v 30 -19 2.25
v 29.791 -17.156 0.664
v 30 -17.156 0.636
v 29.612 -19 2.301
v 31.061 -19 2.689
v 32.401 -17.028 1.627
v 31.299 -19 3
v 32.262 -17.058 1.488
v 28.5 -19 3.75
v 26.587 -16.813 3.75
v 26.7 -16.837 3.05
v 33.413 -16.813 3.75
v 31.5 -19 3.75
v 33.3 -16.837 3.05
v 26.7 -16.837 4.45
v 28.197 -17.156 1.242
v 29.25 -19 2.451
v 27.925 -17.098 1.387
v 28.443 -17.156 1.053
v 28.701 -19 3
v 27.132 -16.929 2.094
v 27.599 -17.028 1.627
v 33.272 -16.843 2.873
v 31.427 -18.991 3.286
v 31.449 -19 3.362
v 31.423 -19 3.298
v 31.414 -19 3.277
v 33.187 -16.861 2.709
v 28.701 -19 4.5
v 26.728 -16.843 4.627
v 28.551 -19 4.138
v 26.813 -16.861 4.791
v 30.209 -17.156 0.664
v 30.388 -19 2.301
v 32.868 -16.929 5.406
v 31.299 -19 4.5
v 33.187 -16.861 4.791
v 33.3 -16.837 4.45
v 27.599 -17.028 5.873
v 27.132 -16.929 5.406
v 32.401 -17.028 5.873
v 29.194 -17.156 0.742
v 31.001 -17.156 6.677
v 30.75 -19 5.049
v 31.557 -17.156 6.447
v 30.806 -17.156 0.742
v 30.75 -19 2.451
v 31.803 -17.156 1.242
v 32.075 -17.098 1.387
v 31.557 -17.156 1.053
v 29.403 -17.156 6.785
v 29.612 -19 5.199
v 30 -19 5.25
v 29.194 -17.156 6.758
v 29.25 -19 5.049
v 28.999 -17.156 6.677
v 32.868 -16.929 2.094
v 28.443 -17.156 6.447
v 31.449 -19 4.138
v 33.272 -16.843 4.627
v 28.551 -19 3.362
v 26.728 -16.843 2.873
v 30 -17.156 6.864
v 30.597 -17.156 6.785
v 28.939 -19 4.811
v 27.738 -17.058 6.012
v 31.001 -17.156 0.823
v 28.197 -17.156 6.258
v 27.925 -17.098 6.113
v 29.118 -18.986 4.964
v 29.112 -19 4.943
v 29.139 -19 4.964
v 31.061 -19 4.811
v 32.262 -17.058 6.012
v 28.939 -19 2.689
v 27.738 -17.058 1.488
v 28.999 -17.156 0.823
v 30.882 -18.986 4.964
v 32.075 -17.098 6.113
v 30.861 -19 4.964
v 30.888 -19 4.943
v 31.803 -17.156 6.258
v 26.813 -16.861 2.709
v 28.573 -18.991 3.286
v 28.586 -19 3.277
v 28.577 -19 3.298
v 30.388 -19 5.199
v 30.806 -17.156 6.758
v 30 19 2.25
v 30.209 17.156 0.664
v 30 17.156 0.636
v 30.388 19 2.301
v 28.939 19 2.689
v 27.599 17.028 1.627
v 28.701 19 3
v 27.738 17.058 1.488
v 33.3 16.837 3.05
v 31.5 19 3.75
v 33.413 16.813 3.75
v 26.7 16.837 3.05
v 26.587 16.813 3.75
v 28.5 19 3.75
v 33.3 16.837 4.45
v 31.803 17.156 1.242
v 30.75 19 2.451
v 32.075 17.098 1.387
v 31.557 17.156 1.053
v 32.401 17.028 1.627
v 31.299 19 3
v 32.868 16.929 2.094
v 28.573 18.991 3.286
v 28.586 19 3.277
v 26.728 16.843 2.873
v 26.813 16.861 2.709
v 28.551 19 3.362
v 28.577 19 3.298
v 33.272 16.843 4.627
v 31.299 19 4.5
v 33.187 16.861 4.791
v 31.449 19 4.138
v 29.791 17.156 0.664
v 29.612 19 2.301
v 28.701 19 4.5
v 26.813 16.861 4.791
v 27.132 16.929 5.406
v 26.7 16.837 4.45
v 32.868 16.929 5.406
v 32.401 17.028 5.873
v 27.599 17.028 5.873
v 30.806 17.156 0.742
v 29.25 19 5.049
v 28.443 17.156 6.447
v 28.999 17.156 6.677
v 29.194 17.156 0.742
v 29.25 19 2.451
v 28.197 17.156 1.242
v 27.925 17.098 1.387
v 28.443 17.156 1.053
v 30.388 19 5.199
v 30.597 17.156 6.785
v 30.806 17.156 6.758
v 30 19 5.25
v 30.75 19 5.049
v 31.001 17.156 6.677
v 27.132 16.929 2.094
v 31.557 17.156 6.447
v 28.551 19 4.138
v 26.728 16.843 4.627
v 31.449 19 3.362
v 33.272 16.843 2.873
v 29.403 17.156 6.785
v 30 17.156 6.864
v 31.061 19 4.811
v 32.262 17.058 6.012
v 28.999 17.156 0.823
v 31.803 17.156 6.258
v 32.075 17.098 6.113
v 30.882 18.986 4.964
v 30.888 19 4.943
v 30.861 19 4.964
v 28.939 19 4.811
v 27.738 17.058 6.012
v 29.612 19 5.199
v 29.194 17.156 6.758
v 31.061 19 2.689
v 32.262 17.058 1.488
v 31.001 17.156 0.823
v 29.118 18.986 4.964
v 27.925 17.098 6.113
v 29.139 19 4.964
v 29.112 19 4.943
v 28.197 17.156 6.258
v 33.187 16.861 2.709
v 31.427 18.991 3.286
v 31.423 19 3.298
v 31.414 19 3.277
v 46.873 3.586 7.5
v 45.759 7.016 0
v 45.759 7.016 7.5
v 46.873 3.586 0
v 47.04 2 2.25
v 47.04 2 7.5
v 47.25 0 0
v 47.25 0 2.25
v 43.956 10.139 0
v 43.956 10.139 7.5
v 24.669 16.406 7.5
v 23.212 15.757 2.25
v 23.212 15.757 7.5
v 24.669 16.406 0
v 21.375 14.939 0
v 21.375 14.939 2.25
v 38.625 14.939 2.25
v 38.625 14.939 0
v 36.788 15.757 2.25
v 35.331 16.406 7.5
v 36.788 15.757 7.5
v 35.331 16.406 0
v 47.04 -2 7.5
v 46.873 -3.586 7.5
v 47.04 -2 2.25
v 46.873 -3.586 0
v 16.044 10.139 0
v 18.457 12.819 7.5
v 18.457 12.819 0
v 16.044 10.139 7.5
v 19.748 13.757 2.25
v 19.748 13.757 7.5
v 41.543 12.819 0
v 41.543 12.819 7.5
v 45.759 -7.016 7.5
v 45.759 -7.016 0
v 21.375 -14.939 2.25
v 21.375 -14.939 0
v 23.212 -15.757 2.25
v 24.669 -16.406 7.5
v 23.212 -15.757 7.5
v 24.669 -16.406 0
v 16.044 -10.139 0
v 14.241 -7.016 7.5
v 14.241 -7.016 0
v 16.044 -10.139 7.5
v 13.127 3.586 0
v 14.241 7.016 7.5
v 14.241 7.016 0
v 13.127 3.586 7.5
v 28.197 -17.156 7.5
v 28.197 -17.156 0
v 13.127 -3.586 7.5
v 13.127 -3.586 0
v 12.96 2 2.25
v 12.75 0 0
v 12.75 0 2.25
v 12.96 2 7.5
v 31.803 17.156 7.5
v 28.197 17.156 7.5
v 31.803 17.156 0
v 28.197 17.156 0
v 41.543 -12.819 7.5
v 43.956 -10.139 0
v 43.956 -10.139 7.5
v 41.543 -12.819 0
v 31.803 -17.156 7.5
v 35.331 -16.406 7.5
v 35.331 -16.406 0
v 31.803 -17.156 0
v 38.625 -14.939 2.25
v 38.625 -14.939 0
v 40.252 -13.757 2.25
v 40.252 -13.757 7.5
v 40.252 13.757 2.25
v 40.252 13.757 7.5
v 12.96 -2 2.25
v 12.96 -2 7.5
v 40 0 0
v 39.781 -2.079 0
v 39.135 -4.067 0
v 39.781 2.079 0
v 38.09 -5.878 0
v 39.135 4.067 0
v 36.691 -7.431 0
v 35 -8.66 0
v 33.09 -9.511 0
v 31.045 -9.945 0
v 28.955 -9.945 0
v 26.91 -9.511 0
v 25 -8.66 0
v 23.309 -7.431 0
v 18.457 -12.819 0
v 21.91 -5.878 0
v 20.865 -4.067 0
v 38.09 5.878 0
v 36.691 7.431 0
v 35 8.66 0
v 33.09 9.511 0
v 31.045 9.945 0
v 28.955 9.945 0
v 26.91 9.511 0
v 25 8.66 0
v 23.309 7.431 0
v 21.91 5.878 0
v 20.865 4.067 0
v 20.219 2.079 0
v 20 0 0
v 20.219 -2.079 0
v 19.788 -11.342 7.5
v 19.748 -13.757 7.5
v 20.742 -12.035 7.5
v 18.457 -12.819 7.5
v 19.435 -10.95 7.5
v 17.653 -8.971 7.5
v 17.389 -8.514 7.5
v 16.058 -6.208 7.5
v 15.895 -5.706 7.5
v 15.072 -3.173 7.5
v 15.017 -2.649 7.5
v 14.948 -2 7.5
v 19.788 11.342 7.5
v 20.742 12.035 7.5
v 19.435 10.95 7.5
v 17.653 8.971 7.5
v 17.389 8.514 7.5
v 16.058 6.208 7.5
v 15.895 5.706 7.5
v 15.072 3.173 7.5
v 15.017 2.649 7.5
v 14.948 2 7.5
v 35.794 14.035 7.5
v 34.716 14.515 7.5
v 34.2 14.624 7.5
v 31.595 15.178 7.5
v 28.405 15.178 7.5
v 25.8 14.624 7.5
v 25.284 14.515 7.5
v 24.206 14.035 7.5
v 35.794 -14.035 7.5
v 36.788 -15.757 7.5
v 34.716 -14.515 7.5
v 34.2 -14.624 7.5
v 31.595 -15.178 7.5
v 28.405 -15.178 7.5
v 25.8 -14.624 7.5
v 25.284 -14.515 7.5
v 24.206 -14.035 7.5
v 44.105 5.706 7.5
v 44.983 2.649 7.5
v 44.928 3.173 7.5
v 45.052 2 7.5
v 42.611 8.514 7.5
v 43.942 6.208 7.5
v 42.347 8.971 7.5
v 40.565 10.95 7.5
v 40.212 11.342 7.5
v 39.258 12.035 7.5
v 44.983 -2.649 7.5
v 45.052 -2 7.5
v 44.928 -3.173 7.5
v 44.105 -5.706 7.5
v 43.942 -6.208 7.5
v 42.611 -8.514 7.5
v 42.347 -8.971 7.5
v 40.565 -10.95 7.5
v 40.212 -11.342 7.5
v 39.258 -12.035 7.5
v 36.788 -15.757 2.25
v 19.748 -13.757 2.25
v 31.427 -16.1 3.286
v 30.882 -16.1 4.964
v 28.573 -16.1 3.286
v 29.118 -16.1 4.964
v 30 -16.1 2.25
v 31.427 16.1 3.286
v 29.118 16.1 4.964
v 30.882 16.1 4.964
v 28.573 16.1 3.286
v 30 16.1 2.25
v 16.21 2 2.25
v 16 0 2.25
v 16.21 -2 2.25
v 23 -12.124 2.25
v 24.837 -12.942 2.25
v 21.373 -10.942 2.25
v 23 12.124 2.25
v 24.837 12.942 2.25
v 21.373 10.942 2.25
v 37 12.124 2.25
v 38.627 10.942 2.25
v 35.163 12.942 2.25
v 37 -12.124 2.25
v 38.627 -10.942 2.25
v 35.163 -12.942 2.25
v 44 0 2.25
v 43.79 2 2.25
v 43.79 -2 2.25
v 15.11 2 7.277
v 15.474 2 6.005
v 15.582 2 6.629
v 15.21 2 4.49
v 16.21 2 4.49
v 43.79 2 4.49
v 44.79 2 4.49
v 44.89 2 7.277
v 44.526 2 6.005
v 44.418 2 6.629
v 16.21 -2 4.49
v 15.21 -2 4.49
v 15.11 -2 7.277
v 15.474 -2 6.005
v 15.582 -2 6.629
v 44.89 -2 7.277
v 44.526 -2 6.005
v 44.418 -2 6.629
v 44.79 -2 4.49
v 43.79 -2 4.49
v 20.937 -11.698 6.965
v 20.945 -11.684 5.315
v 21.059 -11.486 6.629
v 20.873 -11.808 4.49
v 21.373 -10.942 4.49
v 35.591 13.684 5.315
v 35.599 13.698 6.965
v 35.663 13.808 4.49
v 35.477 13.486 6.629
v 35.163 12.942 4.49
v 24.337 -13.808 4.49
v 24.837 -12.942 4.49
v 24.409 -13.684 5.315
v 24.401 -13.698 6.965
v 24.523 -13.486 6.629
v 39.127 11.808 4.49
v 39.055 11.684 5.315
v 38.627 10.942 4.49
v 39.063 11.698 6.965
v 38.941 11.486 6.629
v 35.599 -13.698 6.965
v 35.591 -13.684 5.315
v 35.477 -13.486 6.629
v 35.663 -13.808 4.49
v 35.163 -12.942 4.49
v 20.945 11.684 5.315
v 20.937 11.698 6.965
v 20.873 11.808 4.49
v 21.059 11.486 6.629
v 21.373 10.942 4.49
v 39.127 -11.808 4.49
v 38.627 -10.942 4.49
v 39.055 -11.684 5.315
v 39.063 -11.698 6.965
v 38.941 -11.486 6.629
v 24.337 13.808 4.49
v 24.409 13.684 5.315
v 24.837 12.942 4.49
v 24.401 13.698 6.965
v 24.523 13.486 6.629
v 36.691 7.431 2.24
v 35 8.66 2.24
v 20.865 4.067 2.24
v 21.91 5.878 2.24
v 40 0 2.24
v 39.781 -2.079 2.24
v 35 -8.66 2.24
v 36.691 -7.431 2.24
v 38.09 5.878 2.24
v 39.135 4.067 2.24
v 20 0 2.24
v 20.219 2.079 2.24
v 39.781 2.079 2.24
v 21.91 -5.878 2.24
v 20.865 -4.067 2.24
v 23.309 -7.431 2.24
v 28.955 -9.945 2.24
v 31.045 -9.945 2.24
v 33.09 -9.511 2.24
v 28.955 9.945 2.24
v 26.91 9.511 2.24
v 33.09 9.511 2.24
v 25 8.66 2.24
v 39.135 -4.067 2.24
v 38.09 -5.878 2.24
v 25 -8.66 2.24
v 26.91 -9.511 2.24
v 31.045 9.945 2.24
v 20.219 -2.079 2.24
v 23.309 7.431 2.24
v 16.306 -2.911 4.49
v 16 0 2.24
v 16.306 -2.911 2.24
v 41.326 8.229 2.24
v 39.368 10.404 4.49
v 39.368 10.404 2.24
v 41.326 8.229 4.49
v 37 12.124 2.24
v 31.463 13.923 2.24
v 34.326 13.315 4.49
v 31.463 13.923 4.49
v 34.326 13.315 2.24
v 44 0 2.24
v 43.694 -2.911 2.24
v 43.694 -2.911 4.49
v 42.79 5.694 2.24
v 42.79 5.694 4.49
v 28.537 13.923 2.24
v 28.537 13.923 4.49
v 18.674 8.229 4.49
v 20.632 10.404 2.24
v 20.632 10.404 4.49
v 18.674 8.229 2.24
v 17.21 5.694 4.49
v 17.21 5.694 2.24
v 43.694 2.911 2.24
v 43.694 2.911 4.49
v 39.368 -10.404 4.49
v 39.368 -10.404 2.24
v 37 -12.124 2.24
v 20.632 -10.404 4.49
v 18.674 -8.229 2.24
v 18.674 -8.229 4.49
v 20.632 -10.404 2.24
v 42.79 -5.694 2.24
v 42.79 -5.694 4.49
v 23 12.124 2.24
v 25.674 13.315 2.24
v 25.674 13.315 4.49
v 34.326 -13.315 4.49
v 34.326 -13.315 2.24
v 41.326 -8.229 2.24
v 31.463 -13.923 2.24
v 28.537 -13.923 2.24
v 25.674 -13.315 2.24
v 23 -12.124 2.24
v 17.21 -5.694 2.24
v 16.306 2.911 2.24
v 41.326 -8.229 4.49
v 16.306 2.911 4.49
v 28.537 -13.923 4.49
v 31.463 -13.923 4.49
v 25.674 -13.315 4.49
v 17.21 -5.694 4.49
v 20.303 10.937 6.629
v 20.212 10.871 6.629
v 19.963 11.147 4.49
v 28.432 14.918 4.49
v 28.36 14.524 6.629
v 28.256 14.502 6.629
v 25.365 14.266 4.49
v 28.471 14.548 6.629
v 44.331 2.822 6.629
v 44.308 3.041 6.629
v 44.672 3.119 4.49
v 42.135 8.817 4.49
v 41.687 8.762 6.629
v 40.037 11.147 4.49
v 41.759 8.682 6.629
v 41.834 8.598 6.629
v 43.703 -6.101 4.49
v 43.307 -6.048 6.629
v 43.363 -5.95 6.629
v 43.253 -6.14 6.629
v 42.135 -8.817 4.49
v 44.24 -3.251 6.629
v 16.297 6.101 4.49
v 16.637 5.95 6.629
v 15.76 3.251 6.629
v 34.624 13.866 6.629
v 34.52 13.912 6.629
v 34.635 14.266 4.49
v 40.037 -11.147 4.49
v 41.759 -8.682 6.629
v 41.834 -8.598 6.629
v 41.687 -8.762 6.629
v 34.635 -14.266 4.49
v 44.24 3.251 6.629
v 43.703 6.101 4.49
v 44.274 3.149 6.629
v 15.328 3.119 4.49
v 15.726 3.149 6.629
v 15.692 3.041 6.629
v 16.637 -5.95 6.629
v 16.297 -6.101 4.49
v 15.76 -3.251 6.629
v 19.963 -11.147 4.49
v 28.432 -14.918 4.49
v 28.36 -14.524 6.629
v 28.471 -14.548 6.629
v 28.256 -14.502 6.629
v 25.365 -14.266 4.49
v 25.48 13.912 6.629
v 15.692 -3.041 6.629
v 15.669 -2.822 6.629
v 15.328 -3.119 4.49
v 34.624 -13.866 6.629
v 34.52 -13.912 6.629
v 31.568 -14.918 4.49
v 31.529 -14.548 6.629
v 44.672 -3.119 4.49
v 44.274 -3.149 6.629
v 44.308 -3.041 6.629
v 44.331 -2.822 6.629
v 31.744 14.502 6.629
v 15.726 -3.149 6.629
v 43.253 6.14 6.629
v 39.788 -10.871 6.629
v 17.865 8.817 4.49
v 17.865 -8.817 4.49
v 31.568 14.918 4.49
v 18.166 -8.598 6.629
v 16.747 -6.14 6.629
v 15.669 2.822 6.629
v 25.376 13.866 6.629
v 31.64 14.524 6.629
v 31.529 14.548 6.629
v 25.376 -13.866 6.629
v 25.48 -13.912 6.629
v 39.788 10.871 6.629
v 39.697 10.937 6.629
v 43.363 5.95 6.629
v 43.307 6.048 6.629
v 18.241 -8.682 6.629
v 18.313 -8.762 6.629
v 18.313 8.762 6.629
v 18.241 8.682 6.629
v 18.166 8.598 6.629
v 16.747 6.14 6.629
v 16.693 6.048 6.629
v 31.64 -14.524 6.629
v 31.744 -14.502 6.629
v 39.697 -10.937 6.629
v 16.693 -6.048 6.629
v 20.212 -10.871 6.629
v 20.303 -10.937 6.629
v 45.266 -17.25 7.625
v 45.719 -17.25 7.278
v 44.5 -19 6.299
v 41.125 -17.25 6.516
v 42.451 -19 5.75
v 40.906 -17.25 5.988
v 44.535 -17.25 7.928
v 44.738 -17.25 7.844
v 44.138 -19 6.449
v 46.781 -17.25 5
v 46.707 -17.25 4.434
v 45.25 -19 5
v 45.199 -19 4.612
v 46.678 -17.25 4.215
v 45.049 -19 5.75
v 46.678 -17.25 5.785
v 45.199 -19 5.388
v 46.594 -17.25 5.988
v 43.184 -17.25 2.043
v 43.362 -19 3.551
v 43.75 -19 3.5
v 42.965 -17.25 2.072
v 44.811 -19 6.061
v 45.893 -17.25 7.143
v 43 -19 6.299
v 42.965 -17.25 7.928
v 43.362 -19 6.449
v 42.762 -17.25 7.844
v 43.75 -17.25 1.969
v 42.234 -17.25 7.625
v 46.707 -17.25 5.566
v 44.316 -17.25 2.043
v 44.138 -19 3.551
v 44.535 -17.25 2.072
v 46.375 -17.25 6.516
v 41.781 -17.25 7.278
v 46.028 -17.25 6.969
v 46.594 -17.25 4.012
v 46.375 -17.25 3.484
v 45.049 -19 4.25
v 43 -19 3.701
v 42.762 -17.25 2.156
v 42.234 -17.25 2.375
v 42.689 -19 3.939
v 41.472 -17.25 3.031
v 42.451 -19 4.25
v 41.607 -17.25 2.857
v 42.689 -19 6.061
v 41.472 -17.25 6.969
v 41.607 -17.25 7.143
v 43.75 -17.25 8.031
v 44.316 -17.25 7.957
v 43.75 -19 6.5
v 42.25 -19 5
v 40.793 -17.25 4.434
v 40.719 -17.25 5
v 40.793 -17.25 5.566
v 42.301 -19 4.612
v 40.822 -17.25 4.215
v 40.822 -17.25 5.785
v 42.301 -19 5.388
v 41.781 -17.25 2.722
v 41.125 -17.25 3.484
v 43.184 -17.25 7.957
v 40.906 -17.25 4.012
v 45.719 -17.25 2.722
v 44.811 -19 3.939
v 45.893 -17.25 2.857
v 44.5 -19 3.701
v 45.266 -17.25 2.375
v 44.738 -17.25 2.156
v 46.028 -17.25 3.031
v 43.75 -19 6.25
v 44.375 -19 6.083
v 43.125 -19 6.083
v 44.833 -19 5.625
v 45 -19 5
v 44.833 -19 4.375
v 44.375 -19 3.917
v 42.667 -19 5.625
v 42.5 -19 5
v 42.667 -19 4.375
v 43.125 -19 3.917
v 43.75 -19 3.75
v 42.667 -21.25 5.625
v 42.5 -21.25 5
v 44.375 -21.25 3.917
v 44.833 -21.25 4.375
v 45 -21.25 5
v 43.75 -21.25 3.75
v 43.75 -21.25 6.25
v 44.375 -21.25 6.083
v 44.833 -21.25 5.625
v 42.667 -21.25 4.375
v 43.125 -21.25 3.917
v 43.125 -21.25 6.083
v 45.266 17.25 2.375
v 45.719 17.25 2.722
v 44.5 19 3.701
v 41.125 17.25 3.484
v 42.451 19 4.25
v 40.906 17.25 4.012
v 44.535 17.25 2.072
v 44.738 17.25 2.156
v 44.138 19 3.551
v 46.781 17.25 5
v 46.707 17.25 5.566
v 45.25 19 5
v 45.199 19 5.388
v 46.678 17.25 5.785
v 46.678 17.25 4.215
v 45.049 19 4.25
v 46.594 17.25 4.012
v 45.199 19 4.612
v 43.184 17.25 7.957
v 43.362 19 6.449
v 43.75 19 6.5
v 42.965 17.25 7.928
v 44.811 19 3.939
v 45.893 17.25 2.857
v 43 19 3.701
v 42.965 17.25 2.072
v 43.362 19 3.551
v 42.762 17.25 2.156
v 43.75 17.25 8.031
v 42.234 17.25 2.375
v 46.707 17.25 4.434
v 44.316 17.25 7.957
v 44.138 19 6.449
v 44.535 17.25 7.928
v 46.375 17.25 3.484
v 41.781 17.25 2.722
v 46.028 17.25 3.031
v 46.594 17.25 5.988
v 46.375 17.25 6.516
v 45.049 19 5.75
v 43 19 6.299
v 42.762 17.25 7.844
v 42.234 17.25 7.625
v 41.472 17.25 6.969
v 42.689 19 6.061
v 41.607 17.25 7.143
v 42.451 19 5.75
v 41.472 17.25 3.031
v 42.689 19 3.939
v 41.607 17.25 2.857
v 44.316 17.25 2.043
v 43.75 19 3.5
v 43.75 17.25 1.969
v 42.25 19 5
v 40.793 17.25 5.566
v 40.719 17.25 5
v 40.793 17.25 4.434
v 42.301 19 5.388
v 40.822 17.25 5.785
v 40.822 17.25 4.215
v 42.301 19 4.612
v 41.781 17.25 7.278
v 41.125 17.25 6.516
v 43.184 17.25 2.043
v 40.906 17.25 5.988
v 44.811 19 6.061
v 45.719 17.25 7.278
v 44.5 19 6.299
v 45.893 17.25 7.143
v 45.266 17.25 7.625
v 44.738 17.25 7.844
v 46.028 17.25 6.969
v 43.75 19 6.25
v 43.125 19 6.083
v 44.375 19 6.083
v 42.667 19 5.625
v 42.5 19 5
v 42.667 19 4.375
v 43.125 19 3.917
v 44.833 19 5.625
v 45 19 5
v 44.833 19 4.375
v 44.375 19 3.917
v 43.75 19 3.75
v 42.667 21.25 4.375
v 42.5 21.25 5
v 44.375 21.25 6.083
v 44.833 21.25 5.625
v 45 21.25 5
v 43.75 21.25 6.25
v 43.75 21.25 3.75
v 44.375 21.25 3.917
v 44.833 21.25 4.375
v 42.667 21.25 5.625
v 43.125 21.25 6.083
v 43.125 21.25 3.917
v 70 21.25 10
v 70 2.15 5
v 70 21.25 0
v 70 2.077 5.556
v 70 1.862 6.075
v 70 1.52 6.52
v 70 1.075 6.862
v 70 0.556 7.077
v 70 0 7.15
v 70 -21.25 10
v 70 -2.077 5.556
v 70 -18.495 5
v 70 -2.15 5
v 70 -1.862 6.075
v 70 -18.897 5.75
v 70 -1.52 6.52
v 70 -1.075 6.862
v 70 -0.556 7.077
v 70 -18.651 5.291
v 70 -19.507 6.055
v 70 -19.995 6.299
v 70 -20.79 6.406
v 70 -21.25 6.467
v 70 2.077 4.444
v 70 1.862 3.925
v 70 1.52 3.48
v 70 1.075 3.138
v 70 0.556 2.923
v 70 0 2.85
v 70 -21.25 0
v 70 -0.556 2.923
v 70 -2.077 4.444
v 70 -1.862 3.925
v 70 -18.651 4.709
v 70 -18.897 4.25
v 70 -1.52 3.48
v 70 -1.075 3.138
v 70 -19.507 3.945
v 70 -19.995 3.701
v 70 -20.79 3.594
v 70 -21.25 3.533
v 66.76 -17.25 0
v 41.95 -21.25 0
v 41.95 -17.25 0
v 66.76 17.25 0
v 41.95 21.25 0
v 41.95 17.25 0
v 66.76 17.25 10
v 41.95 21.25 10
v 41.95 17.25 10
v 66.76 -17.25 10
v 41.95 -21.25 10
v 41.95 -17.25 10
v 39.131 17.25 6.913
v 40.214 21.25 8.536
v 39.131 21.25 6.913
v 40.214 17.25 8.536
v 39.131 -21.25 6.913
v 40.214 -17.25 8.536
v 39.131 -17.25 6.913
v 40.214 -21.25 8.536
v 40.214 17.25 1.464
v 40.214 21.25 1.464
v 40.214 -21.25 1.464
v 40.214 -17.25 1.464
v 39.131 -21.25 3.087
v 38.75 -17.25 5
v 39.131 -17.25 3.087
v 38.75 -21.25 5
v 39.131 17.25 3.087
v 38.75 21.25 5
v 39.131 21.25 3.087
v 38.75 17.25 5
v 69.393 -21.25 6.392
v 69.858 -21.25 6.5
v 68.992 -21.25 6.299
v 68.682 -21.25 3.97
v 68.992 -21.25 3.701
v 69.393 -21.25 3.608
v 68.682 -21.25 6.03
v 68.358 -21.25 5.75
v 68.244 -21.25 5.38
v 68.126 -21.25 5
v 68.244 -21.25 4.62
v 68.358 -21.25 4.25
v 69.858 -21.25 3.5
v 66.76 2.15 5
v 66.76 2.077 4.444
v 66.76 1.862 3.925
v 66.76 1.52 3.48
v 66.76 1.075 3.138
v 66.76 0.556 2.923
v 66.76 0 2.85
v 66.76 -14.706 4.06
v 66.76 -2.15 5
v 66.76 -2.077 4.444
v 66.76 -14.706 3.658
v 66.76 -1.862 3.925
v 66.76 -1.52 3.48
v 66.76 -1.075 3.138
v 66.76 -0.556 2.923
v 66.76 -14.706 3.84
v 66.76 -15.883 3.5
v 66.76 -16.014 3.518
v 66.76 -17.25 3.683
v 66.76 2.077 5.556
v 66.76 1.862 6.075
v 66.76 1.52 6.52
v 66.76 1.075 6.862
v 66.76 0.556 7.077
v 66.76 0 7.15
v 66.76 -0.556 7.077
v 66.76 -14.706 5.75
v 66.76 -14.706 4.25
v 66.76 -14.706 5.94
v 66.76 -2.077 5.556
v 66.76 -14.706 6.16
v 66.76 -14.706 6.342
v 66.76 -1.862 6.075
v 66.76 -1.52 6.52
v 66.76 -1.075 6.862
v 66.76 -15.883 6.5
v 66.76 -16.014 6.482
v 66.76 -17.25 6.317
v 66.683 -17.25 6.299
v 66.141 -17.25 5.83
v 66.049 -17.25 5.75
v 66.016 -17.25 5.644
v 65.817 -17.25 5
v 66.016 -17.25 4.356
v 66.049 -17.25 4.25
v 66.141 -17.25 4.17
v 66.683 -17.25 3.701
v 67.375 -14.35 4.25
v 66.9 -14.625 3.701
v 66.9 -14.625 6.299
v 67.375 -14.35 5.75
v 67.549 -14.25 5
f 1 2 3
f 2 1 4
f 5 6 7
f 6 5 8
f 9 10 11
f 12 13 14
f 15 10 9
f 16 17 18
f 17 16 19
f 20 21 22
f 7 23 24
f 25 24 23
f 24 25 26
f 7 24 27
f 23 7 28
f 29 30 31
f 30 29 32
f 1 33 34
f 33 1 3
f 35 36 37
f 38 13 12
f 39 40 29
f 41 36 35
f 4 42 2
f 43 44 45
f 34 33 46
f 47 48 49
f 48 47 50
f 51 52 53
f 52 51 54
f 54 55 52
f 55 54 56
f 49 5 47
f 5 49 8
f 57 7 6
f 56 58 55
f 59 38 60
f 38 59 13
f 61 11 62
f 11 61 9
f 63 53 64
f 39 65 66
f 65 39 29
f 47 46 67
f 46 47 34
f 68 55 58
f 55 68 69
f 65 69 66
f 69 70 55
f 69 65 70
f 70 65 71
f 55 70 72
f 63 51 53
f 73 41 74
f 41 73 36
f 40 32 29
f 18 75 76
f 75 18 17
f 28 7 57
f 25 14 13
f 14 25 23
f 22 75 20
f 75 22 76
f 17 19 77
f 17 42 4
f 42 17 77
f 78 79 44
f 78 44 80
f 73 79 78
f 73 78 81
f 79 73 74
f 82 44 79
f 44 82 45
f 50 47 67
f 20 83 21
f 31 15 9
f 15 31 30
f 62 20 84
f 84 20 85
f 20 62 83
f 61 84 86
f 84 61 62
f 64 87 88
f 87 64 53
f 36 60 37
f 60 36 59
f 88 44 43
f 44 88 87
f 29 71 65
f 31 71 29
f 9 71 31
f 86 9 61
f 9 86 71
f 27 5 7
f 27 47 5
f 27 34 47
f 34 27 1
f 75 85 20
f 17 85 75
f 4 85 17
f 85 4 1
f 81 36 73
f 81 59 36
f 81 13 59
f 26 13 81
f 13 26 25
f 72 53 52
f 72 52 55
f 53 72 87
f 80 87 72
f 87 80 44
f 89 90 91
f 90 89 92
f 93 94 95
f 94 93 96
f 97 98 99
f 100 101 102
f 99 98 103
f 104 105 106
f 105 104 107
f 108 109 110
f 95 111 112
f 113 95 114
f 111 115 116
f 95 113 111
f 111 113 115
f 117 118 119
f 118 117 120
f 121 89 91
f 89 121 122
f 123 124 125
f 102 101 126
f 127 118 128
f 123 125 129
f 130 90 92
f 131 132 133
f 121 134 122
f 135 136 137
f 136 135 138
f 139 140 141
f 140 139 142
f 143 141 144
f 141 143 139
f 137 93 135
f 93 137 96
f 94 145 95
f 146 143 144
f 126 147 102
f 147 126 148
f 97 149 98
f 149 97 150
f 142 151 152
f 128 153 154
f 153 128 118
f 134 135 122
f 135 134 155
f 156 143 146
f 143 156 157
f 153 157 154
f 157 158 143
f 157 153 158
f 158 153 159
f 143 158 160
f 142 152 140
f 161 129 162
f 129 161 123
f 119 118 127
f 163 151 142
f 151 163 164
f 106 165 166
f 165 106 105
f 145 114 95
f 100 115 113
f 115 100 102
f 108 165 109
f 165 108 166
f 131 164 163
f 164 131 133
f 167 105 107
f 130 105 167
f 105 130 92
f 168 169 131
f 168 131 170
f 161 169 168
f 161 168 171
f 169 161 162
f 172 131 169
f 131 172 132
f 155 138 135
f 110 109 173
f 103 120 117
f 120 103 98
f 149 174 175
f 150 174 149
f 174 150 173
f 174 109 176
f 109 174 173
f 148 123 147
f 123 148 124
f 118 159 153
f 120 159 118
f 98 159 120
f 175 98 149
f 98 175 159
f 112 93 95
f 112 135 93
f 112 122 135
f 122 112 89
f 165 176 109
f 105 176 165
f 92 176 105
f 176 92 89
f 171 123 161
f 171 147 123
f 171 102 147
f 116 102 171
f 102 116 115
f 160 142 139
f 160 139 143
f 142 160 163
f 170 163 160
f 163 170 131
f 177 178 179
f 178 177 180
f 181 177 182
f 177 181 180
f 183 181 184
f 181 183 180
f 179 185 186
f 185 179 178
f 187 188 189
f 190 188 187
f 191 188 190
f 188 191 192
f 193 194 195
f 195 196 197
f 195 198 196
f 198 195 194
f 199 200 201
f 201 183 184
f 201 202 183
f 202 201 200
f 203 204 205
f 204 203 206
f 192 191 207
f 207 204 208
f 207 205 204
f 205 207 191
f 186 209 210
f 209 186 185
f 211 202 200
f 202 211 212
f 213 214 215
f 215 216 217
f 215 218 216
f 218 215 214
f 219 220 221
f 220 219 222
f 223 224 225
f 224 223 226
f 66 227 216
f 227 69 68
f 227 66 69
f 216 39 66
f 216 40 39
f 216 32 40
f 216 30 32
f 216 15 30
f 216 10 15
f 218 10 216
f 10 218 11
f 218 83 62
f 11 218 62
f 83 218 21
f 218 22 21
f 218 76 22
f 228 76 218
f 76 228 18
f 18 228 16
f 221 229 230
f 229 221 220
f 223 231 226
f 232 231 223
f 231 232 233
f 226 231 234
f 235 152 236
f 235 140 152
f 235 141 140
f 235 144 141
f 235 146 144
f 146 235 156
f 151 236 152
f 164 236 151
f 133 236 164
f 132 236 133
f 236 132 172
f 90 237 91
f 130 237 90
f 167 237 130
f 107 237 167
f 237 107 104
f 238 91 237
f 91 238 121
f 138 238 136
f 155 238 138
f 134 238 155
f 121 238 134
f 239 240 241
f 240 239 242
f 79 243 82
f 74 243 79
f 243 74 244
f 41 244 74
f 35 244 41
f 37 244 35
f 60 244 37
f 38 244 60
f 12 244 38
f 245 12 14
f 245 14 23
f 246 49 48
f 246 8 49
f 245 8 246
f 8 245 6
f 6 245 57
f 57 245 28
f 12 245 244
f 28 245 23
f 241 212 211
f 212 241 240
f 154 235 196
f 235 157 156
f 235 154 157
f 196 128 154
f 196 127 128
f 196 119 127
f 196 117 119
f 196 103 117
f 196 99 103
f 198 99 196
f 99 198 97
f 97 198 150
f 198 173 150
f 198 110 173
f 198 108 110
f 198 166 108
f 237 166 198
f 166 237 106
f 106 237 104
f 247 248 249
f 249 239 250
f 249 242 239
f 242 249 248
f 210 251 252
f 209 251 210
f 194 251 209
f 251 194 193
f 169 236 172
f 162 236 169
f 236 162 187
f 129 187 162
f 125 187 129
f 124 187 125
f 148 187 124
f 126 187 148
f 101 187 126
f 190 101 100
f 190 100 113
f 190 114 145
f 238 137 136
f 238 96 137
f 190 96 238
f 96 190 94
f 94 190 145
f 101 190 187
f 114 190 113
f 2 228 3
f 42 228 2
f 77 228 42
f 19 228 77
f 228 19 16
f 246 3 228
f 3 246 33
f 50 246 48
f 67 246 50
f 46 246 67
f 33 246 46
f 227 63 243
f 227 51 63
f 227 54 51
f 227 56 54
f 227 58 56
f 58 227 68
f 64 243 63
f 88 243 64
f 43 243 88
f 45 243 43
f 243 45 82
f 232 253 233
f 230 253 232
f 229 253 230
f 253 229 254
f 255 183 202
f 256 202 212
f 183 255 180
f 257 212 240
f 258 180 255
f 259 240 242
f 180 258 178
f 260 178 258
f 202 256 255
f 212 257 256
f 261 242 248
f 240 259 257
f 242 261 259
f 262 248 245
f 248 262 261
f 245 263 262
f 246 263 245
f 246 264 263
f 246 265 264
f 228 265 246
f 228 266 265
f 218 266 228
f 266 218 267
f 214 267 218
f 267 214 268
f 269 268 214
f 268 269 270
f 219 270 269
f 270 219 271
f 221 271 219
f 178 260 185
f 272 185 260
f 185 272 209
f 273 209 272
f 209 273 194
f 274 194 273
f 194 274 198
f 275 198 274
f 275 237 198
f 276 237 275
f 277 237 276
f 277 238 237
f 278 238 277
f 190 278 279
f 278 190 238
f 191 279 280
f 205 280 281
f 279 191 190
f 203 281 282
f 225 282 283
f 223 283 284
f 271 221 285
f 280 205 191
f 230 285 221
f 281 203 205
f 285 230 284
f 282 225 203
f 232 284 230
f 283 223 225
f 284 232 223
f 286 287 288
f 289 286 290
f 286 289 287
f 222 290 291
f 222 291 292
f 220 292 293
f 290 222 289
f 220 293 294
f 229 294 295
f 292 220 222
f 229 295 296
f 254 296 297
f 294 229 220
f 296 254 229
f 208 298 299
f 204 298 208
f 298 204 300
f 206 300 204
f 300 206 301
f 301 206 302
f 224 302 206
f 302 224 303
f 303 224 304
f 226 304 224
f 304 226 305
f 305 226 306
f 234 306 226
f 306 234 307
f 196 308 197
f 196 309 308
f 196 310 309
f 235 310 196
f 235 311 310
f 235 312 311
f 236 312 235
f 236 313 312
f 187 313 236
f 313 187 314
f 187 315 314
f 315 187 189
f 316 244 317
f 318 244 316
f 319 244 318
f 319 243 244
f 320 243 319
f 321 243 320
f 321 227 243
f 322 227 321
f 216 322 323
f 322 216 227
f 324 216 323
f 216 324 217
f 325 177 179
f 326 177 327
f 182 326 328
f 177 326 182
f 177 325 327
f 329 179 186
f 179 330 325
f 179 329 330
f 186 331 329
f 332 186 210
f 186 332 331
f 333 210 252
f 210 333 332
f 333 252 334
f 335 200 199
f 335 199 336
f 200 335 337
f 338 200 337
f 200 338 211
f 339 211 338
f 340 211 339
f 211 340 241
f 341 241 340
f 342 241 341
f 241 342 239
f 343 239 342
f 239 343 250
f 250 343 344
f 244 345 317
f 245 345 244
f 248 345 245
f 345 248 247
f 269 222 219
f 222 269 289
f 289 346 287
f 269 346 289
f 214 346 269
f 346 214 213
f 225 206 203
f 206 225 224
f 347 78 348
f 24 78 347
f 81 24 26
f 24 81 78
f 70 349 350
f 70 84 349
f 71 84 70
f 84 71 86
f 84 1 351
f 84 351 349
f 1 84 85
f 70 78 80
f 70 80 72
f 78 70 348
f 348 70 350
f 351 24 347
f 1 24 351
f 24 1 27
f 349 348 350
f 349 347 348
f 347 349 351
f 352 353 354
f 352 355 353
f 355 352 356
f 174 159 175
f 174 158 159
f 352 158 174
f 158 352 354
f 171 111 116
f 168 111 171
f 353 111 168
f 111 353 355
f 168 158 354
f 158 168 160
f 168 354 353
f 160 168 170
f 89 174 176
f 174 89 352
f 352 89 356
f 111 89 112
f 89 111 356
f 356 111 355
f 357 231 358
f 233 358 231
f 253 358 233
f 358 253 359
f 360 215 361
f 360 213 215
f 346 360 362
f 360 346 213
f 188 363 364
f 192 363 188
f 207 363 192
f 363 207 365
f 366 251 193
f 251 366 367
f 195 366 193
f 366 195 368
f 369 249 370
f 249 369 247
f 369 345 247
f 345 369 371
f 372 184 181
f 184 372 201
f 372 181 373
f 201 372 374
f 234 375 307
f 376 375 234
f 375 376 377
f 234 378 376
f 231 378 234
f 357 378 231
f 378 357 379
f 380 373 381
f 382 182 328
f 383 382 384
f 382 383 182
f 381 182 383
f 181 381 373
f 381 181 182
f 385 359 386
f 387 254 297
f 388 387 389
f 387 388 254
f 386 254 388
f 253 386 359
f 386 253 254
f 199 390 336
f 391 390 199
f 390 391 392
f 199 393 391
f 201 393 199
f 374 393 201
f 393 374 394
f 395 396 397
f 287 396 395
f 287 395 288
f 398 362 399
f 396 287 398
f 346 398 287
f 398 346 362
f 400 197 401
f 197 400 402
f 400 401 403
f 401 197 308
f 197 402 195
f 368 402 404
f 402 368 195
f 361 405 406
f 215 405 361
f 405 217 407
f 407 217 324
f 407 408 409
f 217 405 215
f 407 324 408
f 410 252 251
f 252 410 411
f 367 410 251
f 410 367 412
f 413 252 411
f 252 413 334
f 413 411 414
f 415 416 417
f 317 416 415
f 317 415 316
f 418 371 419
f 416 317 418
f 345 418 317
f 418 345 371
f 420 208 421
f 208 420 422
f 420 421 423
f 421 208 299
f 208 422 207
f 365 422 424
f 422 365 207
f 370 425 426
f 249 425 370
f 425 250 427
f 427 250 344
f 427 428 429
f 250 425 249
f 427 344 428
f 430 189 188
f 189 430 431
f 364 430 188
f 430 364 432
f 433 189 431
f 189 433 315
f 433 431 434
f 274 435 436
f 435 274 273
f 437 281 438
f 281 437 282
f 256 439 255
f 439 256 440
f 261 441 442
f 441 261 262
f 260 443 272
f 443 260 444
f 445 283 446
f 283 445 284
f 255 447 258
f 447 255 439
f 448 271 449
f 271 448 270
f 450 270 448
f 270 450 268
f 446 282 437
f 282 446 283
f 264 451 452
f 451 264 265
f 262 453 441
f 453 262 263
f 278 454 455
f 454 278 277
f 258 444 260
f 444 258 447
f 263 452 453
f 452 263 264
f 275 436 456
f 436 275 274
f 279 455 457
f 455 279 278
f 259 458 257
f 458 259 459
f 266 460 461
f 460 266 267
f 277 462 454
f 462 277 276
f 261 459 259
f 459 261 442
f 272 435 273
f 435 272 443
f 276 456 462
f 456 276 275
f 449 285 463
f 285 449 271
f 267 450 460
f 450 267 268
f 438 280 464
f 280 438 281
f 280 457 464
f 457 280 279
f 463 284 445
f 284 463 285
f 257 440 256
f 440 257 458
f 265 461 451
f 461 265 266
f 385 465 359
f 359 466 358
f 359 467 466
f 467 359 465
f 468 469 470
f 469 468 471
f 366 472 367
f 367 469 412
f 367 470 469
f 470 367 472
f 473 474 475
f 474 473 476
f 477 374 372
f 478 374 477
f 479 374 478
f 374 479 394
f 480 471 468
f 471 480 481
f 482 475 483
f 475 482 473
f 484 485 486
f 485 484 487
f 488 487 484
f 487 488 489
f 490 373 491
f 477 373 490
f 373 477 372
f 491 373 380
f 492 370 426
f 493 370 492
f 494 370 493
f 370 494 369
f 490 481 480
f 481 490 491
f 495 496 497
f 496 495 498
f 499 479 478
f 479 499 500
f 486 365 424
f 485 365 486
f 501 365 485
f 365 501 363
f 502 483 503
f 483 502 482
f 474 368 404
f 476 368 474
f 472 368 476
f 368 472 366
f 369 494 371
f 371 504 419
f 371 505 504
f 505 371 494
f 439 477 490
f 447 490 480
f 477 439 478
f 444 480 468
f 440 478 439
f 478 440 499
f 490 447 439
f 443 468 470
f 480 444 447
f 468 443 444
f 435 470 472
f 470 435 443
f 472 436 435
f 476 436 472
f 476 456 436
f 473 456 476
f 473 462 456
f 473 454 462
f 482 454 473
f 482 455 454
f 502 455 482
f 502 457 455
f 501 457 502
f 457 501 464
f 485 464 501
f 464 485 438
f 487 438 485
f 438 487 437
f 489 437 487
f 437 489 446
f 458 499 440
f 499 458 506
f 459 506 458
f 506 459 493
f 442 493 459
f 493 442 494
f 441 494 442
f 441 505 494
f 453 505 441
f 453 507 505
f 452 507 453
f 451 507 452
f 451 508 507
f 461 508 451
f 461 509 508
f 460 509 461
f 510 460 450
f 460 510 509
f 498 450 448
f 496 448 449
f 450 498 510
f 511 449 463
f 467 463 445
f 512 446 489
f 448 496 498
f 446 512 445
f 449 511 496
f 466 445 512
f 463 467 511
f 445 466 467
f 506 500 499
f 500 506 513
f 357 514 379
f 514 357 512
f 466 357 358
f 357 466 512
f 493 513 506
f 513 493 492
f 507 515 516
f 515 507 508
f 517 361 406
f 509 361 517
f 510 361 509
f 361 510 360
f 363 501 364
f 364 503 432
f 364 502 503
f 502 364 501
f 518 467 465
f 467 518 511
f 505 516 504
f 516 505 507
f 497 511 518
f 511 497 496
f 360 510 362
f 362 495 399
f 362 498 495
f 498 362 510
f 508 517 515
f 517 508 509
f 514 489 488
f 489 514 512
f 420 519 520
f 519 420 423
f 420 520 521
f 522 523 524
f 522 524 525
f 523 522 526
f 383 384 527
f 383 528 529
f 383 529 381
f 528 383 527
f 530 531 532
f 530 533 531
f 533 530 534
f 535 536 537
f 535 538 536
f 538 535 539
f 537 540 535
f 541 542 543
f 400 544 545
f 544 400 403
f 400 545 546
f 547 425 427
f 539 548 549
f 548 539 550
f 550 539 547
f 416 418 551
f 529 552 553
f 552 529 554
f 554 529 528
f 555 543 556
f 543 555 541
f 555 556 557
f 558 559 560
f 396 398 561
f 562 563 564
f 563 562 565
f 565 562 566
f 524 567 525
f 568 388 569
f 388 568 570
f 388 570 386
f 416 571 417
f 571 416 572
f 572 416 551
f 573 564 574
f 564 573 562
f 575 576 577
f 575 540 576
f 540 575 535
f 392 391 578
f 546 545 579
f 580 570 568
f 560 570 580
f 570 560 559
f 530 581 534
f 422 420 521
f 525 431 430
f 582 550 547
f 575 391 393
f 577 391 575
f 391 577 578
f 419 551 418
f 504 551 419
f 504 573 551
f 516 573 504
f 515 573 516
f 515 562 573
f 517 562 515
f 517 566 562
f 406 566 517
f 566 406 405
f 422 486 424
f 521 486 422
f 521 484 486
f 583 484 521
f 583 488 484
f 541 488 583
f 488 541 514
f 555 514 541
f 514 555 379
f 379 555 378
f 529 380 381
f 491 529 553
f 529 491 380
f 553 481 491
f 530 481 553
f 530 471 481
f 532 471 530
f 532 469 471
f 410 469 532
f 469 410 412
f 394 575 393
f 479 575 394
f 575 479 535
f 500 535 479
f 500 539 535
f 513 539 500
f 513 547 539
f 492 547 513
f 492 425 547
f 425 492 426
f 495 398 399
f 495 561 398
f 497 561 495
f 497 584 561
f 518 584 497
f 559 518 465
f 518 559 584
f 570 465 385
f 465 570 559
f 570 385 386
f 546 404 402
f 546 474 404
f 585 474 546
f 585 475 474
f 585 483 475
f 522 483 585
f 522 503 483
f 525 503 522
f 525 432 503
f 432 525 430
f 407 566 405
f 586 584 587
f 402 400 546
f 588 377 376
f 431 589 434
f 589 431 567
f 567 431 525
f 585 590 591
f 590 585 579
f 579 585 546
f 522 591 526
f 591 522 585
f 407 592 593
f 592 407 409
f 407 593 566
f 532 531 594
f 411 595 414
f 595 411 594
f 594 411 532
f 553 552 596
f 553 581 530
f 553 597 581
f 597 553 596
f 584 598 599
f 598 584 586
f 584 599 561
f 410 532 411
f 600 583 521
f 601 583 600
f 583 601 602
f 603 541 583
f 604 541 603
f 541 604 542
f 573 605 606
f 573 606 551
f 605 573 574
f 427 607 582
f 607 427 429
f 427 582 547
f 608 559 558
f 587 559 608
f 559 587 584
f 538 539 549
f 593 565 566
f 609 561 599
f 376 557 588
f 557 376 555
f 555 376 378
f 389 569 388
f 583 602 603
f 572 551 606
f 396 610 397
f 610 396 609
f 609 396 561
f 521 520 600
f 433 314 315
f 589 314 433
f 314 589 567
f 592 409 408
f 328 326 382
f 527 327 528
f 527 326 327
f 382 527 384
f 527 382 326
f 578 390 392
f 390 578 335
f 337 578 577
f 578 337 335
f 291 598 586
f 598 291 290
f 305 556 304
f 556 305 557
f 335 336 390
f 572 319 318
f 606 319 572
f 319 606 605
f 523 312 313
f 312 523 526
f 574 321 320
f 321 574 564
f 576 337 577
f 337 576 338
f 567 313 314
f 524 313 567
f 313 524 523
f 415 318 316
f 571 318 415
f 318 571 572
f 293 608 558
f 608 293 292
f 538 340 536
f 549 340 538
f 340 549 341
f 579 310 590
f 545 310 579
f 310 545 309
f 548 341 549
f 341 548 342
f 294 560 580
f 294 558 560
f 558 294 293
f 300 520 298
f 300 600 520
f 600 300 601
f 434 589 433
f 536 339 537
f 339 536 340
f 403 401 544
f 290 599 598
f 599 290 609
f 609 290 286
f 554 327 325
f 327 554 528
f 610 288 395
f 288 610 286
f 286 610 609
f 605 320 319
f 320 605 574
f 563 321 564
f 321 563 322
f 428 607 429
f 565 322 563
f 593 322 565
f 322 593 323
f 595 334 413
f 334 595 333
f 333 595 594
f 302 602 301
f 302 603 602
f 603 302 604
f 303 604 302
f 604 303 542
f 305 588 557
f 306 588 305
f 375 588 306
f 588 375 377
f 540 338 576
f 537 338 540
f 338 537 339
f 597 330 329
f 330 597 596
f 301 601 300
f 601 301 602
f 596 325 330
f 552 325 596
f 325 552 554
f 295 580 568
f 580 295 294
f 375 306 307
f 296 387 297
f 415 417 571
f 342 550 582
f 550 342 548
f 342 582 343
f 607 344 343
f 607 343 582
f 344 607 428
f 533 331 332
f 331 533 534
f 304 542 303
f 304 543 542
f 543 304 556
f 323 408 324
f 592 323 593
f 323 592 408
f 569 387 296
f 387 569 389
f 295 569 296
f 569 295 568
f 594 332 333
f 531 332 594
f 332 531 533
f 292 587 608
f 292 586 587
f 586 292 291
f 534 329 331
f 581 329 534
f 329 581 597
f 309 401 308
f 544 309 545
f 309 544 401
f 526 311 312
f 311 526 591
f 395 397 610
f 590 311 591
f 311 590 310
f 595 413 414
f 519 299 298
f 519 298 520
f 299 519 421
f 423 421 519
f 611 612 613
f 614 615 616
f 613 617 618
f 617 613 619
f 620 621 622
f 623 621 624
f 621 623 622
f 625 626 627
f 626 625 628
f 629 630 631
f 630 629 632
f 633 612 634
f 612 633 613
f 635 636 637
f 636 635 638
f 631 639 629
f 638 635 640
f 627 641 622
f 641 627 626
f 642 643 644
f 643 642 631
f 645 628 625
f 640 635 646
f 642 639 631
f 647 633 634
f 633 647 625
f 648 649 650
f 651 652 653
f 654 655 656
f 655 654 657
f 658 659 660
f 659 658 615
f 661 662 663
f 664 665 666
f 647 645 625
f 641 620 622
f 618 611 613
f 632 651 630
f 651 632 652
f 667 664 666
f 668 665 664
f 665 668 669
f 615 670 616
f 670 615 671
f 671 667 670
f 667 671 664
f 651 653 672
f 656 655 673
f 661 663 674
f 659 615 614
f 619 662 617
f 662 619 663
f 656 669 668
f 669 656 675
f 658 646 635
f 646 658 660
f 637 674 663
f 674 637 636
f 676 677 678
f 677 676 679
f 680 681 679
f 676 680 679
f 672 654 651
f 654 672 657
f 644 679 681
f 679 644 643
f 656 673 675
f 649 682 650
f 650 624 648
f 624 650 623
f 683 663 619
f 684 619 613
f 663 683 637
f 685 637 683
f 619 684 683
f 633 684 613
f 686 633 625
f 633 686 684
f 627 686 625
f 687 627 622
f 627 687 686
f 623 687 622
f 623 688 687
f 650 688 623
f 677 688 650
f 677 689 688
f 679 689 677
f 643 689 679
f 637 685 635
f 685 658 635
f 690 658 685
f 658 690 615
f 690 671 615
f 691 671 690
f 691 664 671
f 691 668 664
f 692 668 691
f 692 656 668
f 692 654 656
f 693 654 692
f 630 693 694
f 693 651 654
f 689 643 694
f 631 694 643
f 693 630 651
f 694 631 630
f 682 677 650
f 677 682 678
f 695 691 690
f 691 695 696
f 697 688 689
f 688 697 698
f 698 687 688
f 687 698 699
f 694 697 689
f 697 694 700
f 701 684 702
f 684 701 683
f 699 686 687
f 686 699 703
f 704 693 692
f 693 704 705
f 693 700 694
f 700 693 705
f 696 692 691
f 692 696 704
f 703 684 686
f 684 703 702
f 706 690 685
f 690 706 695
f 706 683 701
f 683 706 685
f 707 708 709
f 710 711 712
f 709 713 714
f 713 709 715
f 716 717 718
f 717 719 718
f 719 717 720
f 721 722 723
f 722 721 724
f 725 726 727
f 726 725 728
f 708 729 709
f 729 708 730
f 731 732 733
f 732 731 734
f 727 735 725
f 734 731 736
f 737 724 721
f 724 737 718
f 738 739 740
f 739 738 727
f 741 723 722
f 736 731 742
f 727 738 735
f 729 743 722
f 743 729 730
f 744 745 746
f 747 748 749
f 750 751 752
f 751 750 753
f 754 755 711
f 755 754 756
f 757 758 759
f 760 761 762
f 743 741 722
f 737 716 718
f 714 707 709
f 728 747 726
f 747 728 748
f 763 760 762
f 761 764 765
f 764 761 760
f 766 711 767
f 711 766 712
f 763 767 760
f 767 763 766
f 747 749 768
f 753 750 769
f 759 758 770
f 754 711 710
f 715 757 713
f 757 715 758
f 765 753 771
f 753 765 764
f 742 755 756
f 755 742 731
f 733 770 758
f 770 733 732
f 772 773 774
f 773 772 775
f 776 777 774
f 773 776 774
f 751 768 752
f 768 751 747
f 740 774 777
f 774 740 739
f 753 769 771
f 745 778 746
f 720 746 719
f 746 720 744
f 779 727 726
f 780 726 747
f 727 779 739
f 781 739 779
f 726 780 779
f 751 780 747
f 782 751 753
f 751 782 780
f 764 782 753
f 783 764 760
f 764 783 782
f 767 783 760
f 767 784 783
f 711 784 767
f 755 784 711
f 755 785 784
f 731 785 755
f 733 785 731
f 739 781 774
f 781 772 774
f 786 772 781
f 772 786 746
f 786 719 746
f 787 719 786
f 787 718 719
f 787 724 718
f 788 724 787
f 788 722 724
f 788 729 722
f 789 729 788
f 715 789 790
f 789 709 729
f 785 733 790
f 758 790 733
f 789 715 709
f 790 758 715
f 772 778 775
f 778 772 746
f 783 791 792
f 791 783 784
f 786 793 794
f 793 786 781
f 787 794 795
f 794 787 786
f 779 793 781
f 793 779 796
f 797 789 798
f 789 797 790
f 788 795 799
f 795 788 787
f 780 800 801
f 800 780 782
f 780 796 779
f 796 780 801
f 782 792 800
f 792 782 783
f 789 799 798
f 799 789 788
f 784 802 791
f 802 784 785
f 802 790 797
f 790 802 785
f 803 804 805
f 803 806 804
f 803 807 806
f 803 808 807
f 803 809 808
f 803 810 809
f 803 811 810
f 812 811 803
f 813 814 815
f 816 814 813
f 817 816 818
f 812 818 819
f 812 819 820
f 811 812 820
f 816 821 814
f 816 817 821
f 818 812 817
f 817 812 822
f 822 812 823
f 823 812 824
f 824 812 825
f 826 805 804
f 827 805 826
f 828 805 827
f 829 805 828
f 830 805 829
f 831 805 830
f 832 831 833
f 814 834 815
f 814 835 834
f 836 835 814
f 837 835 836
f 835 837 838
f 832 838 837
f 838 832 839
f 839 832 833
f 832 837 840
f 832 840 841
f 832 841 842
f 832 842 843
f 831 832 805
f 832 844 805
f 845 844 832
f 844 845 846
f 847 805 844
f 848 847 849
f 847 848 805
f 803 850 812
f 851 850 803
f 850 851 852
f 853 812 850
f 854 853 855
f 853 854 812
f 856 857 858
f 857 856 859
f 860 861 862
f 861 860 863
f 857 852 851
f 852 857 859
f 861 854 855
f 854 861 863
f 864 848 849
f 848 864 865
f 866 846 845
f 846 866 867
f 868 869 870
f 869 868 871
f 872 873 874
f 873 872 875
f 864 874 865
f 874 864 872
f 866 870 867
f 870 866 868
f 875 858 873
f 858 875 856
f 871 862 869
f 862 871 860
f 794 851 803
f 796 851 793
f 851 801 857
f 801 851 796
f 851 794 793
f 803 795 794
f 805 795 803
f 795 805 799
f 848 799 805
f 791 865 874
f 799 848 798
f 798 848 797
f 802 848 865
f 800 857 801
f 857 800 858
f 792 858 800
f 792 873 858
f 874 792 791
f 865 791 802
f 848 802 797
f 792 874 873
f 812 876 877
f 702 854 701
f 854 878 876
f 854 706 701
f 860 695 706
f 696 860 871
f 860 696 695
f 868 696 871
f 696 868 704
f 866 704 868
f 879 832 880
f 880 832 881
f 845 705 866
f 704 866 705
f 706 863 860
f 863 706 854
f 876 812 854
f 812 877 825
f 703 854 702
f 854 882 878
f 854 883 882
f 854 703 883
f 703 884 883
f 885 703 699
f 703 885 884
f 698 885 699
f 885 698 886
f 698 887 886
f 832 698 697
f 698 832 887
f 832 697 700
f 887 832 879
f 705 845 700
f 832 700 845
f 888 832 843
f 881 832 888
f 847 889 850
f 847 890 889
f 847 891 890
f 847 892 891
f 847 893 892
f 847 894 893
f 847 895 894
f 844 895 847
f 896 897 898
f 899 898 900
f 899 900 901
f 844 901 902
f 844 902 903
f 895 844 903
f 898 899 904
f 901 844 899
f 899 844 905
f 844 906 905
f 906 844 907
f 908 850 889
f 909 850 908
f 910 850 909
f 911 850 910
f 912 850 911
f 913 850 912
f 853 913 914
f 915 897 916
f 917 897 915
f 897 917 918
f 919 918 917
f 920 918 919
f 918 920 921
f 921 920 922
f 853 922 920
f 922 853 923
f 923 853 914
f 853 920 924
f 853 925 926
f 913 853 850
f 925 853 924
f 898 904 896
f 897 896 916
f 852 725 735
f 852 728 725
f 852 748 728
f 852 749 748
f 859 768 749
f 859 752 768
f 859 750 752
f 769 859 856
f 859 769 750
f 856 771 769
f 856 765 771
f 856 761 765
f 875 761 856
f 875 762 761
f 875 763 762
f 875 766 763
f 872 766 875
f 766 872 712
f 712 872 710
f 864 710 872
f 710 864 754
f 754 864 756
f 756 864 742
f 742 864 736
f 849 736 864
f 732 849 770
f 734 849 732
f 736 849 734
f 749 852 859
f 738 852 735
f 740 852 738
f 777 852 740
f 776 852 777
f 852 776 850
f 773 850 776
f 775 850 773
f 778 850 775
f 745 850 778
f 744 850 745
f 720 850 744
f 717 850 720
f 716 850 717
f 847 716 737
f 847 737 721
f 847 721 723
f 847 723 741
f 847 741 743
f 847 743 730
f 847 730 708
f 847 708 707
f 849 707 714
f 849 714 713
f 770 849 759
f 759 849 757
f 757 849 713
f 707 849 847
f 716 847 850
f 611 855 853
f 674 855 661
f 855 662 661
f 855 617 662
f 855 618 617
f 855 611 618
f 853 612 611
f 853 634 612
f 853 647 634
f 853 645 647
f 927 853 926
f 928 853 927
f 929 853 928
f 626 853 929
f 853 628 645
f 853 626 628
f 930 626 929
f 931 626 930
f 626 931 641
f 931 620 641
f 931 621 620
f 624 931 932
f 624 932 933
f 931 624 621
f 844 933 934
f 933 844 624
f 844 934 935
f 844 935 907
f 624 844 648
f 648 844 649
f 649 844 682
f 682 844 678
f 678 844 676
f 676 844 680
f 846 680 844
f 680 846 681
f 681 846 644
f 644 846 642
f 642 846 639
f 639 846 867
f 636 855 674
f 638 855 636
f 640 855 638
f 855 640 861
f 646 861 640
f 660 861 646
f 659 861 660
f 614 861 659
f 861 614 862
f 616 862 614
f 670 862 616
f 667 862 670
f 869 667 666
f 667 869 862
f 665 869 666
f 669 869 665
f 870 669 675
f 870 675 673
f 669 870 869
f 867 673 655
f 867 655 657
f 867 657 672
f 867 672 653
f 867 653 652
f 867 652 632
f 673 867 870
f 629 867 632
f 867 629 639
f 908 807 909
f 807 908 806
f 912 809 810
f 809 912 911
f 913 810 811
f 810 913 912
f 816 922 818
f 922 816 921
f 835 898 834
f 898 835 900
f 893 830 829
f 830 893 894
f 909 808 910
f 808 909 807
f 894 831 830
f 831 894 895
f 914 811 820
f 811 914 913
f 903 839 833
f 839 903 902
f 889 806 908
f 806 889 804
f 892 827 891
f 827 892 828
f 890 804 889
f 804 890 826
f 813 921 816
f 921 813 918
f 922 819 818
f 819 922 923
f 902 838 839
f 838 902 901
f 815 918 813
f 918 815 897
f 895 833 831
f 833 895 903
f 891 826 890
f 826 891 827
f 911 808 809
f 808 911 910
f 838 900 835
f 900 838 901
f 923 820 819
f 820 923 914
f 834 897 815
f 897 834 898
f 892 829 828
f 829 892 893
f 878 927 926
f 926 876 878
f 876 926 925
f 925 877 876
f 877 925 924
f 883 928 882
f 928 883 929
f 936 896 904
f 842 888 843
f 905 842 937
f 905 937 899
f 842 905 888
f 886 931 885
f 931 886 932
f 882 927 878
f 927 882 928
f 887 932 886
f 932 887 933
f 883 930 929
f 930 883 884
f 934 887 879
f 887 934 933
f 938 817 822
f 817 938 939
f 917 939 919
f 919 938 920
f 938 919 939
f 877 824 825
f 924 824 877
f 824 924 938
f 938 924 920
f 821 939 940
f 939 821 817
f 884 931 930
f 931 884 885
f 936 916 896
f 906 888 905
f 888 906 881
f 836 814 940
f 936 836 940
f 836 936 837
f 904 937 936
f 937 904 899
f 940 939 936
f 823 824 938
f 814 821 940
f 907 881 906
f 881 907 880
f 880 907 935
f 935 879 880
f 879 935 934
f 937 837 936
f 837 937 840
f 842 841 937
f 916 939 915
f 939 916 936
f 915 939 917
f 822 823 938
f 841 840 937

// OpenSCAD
//////////////////////////////////////////////////////////////////////////////////////
///
///  Tiltable frame for G4-type SMD LED lamps
///
///  This is a little tiltable and rotatable frame to mount the easily available
///  and inexpensive round G4 type 12V SMD LED lamps.
///
///  The frame consists of two printed part, the LED holder and the base.  These
///  two parts are joined by a conical hinge, so that the angle of the lamp can
///  be adjusted as needed.  The conical hinge holds by friction, but screw holes
///  are also provided in case a firmer grip is needed. The frame has a central
///  screw hole so that it can be attached to any flat surface.  If a washer is
///  used and the screw is not tightened too strongly, the lamp can also be 
///  rotated around the screw, providing full angular coverage.  A hole in one corner
///  of the frame can be used for feeding the cables through.
///  
///  The led carrier is simply pushed into the led holder - it should snap in with
///  a click.
///
//////////////////////////////////////////////////////////////////////////////////////
///
///  2013-11-27 Heinz Spiess, Switzerland
///
///  released under Creative Commons - Attribution - Share Alike licence
//////////////////////////////////////////////////////////////////////////////////////

// The following are defined as parameters of the modules
// ledD = 23.3; // diameter of led carrier
// wall = 1.72; // thickness of walls

// The following are globally parametrized
ledM = 1;       // margin to outermost led
ledH = 3;       // led height
ledP = 0.7;     // position of click
ledC = 0.4;     // depth of click 
ledG = 4;       // gap width
hingeW = 10;    // hinge width
hingeD = 4;     // hinge depth
hingeH = 18;    // hinge height
hingeR = 1.5;   // hinge radius
eps = 0;        // separation between outer and inner parts of hinge
granu = 24;     // angular granularity of hinge

// tiltable circular led holder
module ledholder(ledD=23.3,wall=1.72){
      
    difference(){
        union(){
	   // bottom plate
	   cylinder(r=ledD/2+wall,h=ledH+2*wall);
	   // hinge
	   for(a=[90,270])rotate(a)
	      translate([-ledD/2-hingeD,0,(wall+ledH/2)])
	         rotate([0,90,0])cylinder(r1=hingeR,r2=hingeW/2,h=hingeD,$fn=granu);

        }

        // screw holes in hinge
	for(a=[90,270])rotate(a)
	      translate([-ledD/2-hingeD-0.1,0,(wall+ledH/2)])
	         rotate([0,90,0])cylinder(r=hingeR-eps,h=hingeD-1);

        // cut off top excess part of hinge
	translate([0,0,ledH+2*wall])cylinder(r=ledD/2+wall+hingeD,h=hingeW);
        // cut off bottom excess part of hinge
	translate([0,0,-hingeW])cylinder(r=ledD/2+wall+hingeD,h=hingeW);
	// hole in bottom plate
	translate([0,0,-0.01])cylinder(r=ledD/3,h=wall+0.02);
	// spacer between bottom plate and led carrier
	translate([0,0,wall-0.01])cylinder(r=ledD/2-ledM,h=wall+0.02);
	// seat of led carrier and lower snap-in
	translate([0,0,2*wall-0.01])cylinder(r=ledD/2,r2=ledD/2-ledC,h=ledP*ledH+0.2);
	// upper snap-in
	translate([0,0,2*wall+ledP*ledH-0.01])
	   cylinder(r1=ledD/2-ledC,r2=ledD/2+ledC,h=(1-ledP)*ledH+0.2);
        // cut-out 6 sectors
	for(a=[0:60:359])rotate(a)translate([-ledD,-ledG/2,wall])cube([2*ledD,ledG,2*ledH+wall]);


    }
}

// base of led frame
module ledbase(ledD=23.3,hingeH=18,wall=1.72){
  difference(){
    union(){
        
	   hull(){
	      // rectangular bottom part
              translate([-hingeW/2,-ledD/2-eps-hingeD-wall,0])
	         cube([hingeW,ledD+2*eps+2*hingeD+2*wall,wall+hingeH+1.8]);
              // cylindical top part
	      translate([0,-ledD/2-eps-hingeD-wall,wall+hingeH])rotate([-90,0,0])
	         cylinder(r=hingeW/2,h=2*hingeD+2*wall+ledD+2*eps);
	   }
    }
    // rectangular cut-out
    translate([-hingeW/2-0.01,-ledD/2-eps-wall,wall+0.99])
       cube([hingeW+0.02,ledD+2*eps+2*wall,hingeH+hingeW/2+1]);
    // hinge cut-out
    for(a=[90,270])rotate(a)
       translate([-ledD/2+eps-hingeD,0,wall+hingeH])rotate([0,90,0]){
           // conical part
           cylinder(r1=hingeR,r2=hingeW/2,h=hingeD,$fn=granu);
	   // screw hole
           translate([0,0,-7])cylinder(r=hingeW/8,h=hingeD+9,$fn=12);

       }

    // central hole for mounting screw
    translate([0,0,-1])cylinder(r=4.3/2,h=wall+2,$fn=24);

    // side hole for feeding cables
    translate([0,-ledD/2-eps,wall+1.5])rotate([120,0,0])
           cylinder(r=1.5,h=hingeD+9,$fn=12);
  }
}

// This module composes base and led holder in their final position
// using a given tilt angle of the led holder
// *** Just for illustration - don't use for printing!!! ***
module compose(angle=0,ledD=23.3,hingeH=18,wall=1.72){
  //intersection(){  // use intersection to verify that there is no overlap
  union(){           // use union for normal drawing
    color("red")translate([0,0,hingeH-ledH/2])translate([0,0,+ledH/2+wall/2])rotate([0,angle,0])translate([0,0,-ledH/2-wall/2])ledholder(ledD=ledD,wall=wall);
    color("blue")ledbase(ledD=ledD,hingeH=hingeH,wall=wall);
  }
}


//>>> uncomment exactly *one* of the following lines to choose the proper LED carrier size
//assign(led=6){   // uncomment for 23mm diameter 6 LED carrier 
//assign(led=9){   // uncomment for 24mm diameter 9 LED carrier
assign(led=12){  // uncomment for 30mm diameter 12 LED carrier
//<<<

  if(led==6){
    %compose(angle=85,ledD=23.3);
    translate([30,0,0])ledholder(ledD=23.3);
    translate([60,0,hingeW/2])rotate([0,-90,0])ledbase(ledD=23.3);
  }else if(led==9){
    %compose(angle=30,ledD=24.5,hingeH=24,wall=2.25);
    translate([30,0,0])ledholder(ledD=24.5,wall=2.25);
    translate([70,0,hingeW/2])rotate([0,-90,0])ledbase(ledD=24.5,hingeH=21,wall=2.25);
  }else if(led==12){
    %compose(angle=30,ledD=30.0,hingeH=24,wall=2.25);
    translate([30,0,0])ledholder(ledD=30.0,wall=2.25);
    translate([70,0,hingeW/2])rotate([0,-90,0])ledbase(ledD=30.0,hingeH=24,wall=2.25);
  }
}
